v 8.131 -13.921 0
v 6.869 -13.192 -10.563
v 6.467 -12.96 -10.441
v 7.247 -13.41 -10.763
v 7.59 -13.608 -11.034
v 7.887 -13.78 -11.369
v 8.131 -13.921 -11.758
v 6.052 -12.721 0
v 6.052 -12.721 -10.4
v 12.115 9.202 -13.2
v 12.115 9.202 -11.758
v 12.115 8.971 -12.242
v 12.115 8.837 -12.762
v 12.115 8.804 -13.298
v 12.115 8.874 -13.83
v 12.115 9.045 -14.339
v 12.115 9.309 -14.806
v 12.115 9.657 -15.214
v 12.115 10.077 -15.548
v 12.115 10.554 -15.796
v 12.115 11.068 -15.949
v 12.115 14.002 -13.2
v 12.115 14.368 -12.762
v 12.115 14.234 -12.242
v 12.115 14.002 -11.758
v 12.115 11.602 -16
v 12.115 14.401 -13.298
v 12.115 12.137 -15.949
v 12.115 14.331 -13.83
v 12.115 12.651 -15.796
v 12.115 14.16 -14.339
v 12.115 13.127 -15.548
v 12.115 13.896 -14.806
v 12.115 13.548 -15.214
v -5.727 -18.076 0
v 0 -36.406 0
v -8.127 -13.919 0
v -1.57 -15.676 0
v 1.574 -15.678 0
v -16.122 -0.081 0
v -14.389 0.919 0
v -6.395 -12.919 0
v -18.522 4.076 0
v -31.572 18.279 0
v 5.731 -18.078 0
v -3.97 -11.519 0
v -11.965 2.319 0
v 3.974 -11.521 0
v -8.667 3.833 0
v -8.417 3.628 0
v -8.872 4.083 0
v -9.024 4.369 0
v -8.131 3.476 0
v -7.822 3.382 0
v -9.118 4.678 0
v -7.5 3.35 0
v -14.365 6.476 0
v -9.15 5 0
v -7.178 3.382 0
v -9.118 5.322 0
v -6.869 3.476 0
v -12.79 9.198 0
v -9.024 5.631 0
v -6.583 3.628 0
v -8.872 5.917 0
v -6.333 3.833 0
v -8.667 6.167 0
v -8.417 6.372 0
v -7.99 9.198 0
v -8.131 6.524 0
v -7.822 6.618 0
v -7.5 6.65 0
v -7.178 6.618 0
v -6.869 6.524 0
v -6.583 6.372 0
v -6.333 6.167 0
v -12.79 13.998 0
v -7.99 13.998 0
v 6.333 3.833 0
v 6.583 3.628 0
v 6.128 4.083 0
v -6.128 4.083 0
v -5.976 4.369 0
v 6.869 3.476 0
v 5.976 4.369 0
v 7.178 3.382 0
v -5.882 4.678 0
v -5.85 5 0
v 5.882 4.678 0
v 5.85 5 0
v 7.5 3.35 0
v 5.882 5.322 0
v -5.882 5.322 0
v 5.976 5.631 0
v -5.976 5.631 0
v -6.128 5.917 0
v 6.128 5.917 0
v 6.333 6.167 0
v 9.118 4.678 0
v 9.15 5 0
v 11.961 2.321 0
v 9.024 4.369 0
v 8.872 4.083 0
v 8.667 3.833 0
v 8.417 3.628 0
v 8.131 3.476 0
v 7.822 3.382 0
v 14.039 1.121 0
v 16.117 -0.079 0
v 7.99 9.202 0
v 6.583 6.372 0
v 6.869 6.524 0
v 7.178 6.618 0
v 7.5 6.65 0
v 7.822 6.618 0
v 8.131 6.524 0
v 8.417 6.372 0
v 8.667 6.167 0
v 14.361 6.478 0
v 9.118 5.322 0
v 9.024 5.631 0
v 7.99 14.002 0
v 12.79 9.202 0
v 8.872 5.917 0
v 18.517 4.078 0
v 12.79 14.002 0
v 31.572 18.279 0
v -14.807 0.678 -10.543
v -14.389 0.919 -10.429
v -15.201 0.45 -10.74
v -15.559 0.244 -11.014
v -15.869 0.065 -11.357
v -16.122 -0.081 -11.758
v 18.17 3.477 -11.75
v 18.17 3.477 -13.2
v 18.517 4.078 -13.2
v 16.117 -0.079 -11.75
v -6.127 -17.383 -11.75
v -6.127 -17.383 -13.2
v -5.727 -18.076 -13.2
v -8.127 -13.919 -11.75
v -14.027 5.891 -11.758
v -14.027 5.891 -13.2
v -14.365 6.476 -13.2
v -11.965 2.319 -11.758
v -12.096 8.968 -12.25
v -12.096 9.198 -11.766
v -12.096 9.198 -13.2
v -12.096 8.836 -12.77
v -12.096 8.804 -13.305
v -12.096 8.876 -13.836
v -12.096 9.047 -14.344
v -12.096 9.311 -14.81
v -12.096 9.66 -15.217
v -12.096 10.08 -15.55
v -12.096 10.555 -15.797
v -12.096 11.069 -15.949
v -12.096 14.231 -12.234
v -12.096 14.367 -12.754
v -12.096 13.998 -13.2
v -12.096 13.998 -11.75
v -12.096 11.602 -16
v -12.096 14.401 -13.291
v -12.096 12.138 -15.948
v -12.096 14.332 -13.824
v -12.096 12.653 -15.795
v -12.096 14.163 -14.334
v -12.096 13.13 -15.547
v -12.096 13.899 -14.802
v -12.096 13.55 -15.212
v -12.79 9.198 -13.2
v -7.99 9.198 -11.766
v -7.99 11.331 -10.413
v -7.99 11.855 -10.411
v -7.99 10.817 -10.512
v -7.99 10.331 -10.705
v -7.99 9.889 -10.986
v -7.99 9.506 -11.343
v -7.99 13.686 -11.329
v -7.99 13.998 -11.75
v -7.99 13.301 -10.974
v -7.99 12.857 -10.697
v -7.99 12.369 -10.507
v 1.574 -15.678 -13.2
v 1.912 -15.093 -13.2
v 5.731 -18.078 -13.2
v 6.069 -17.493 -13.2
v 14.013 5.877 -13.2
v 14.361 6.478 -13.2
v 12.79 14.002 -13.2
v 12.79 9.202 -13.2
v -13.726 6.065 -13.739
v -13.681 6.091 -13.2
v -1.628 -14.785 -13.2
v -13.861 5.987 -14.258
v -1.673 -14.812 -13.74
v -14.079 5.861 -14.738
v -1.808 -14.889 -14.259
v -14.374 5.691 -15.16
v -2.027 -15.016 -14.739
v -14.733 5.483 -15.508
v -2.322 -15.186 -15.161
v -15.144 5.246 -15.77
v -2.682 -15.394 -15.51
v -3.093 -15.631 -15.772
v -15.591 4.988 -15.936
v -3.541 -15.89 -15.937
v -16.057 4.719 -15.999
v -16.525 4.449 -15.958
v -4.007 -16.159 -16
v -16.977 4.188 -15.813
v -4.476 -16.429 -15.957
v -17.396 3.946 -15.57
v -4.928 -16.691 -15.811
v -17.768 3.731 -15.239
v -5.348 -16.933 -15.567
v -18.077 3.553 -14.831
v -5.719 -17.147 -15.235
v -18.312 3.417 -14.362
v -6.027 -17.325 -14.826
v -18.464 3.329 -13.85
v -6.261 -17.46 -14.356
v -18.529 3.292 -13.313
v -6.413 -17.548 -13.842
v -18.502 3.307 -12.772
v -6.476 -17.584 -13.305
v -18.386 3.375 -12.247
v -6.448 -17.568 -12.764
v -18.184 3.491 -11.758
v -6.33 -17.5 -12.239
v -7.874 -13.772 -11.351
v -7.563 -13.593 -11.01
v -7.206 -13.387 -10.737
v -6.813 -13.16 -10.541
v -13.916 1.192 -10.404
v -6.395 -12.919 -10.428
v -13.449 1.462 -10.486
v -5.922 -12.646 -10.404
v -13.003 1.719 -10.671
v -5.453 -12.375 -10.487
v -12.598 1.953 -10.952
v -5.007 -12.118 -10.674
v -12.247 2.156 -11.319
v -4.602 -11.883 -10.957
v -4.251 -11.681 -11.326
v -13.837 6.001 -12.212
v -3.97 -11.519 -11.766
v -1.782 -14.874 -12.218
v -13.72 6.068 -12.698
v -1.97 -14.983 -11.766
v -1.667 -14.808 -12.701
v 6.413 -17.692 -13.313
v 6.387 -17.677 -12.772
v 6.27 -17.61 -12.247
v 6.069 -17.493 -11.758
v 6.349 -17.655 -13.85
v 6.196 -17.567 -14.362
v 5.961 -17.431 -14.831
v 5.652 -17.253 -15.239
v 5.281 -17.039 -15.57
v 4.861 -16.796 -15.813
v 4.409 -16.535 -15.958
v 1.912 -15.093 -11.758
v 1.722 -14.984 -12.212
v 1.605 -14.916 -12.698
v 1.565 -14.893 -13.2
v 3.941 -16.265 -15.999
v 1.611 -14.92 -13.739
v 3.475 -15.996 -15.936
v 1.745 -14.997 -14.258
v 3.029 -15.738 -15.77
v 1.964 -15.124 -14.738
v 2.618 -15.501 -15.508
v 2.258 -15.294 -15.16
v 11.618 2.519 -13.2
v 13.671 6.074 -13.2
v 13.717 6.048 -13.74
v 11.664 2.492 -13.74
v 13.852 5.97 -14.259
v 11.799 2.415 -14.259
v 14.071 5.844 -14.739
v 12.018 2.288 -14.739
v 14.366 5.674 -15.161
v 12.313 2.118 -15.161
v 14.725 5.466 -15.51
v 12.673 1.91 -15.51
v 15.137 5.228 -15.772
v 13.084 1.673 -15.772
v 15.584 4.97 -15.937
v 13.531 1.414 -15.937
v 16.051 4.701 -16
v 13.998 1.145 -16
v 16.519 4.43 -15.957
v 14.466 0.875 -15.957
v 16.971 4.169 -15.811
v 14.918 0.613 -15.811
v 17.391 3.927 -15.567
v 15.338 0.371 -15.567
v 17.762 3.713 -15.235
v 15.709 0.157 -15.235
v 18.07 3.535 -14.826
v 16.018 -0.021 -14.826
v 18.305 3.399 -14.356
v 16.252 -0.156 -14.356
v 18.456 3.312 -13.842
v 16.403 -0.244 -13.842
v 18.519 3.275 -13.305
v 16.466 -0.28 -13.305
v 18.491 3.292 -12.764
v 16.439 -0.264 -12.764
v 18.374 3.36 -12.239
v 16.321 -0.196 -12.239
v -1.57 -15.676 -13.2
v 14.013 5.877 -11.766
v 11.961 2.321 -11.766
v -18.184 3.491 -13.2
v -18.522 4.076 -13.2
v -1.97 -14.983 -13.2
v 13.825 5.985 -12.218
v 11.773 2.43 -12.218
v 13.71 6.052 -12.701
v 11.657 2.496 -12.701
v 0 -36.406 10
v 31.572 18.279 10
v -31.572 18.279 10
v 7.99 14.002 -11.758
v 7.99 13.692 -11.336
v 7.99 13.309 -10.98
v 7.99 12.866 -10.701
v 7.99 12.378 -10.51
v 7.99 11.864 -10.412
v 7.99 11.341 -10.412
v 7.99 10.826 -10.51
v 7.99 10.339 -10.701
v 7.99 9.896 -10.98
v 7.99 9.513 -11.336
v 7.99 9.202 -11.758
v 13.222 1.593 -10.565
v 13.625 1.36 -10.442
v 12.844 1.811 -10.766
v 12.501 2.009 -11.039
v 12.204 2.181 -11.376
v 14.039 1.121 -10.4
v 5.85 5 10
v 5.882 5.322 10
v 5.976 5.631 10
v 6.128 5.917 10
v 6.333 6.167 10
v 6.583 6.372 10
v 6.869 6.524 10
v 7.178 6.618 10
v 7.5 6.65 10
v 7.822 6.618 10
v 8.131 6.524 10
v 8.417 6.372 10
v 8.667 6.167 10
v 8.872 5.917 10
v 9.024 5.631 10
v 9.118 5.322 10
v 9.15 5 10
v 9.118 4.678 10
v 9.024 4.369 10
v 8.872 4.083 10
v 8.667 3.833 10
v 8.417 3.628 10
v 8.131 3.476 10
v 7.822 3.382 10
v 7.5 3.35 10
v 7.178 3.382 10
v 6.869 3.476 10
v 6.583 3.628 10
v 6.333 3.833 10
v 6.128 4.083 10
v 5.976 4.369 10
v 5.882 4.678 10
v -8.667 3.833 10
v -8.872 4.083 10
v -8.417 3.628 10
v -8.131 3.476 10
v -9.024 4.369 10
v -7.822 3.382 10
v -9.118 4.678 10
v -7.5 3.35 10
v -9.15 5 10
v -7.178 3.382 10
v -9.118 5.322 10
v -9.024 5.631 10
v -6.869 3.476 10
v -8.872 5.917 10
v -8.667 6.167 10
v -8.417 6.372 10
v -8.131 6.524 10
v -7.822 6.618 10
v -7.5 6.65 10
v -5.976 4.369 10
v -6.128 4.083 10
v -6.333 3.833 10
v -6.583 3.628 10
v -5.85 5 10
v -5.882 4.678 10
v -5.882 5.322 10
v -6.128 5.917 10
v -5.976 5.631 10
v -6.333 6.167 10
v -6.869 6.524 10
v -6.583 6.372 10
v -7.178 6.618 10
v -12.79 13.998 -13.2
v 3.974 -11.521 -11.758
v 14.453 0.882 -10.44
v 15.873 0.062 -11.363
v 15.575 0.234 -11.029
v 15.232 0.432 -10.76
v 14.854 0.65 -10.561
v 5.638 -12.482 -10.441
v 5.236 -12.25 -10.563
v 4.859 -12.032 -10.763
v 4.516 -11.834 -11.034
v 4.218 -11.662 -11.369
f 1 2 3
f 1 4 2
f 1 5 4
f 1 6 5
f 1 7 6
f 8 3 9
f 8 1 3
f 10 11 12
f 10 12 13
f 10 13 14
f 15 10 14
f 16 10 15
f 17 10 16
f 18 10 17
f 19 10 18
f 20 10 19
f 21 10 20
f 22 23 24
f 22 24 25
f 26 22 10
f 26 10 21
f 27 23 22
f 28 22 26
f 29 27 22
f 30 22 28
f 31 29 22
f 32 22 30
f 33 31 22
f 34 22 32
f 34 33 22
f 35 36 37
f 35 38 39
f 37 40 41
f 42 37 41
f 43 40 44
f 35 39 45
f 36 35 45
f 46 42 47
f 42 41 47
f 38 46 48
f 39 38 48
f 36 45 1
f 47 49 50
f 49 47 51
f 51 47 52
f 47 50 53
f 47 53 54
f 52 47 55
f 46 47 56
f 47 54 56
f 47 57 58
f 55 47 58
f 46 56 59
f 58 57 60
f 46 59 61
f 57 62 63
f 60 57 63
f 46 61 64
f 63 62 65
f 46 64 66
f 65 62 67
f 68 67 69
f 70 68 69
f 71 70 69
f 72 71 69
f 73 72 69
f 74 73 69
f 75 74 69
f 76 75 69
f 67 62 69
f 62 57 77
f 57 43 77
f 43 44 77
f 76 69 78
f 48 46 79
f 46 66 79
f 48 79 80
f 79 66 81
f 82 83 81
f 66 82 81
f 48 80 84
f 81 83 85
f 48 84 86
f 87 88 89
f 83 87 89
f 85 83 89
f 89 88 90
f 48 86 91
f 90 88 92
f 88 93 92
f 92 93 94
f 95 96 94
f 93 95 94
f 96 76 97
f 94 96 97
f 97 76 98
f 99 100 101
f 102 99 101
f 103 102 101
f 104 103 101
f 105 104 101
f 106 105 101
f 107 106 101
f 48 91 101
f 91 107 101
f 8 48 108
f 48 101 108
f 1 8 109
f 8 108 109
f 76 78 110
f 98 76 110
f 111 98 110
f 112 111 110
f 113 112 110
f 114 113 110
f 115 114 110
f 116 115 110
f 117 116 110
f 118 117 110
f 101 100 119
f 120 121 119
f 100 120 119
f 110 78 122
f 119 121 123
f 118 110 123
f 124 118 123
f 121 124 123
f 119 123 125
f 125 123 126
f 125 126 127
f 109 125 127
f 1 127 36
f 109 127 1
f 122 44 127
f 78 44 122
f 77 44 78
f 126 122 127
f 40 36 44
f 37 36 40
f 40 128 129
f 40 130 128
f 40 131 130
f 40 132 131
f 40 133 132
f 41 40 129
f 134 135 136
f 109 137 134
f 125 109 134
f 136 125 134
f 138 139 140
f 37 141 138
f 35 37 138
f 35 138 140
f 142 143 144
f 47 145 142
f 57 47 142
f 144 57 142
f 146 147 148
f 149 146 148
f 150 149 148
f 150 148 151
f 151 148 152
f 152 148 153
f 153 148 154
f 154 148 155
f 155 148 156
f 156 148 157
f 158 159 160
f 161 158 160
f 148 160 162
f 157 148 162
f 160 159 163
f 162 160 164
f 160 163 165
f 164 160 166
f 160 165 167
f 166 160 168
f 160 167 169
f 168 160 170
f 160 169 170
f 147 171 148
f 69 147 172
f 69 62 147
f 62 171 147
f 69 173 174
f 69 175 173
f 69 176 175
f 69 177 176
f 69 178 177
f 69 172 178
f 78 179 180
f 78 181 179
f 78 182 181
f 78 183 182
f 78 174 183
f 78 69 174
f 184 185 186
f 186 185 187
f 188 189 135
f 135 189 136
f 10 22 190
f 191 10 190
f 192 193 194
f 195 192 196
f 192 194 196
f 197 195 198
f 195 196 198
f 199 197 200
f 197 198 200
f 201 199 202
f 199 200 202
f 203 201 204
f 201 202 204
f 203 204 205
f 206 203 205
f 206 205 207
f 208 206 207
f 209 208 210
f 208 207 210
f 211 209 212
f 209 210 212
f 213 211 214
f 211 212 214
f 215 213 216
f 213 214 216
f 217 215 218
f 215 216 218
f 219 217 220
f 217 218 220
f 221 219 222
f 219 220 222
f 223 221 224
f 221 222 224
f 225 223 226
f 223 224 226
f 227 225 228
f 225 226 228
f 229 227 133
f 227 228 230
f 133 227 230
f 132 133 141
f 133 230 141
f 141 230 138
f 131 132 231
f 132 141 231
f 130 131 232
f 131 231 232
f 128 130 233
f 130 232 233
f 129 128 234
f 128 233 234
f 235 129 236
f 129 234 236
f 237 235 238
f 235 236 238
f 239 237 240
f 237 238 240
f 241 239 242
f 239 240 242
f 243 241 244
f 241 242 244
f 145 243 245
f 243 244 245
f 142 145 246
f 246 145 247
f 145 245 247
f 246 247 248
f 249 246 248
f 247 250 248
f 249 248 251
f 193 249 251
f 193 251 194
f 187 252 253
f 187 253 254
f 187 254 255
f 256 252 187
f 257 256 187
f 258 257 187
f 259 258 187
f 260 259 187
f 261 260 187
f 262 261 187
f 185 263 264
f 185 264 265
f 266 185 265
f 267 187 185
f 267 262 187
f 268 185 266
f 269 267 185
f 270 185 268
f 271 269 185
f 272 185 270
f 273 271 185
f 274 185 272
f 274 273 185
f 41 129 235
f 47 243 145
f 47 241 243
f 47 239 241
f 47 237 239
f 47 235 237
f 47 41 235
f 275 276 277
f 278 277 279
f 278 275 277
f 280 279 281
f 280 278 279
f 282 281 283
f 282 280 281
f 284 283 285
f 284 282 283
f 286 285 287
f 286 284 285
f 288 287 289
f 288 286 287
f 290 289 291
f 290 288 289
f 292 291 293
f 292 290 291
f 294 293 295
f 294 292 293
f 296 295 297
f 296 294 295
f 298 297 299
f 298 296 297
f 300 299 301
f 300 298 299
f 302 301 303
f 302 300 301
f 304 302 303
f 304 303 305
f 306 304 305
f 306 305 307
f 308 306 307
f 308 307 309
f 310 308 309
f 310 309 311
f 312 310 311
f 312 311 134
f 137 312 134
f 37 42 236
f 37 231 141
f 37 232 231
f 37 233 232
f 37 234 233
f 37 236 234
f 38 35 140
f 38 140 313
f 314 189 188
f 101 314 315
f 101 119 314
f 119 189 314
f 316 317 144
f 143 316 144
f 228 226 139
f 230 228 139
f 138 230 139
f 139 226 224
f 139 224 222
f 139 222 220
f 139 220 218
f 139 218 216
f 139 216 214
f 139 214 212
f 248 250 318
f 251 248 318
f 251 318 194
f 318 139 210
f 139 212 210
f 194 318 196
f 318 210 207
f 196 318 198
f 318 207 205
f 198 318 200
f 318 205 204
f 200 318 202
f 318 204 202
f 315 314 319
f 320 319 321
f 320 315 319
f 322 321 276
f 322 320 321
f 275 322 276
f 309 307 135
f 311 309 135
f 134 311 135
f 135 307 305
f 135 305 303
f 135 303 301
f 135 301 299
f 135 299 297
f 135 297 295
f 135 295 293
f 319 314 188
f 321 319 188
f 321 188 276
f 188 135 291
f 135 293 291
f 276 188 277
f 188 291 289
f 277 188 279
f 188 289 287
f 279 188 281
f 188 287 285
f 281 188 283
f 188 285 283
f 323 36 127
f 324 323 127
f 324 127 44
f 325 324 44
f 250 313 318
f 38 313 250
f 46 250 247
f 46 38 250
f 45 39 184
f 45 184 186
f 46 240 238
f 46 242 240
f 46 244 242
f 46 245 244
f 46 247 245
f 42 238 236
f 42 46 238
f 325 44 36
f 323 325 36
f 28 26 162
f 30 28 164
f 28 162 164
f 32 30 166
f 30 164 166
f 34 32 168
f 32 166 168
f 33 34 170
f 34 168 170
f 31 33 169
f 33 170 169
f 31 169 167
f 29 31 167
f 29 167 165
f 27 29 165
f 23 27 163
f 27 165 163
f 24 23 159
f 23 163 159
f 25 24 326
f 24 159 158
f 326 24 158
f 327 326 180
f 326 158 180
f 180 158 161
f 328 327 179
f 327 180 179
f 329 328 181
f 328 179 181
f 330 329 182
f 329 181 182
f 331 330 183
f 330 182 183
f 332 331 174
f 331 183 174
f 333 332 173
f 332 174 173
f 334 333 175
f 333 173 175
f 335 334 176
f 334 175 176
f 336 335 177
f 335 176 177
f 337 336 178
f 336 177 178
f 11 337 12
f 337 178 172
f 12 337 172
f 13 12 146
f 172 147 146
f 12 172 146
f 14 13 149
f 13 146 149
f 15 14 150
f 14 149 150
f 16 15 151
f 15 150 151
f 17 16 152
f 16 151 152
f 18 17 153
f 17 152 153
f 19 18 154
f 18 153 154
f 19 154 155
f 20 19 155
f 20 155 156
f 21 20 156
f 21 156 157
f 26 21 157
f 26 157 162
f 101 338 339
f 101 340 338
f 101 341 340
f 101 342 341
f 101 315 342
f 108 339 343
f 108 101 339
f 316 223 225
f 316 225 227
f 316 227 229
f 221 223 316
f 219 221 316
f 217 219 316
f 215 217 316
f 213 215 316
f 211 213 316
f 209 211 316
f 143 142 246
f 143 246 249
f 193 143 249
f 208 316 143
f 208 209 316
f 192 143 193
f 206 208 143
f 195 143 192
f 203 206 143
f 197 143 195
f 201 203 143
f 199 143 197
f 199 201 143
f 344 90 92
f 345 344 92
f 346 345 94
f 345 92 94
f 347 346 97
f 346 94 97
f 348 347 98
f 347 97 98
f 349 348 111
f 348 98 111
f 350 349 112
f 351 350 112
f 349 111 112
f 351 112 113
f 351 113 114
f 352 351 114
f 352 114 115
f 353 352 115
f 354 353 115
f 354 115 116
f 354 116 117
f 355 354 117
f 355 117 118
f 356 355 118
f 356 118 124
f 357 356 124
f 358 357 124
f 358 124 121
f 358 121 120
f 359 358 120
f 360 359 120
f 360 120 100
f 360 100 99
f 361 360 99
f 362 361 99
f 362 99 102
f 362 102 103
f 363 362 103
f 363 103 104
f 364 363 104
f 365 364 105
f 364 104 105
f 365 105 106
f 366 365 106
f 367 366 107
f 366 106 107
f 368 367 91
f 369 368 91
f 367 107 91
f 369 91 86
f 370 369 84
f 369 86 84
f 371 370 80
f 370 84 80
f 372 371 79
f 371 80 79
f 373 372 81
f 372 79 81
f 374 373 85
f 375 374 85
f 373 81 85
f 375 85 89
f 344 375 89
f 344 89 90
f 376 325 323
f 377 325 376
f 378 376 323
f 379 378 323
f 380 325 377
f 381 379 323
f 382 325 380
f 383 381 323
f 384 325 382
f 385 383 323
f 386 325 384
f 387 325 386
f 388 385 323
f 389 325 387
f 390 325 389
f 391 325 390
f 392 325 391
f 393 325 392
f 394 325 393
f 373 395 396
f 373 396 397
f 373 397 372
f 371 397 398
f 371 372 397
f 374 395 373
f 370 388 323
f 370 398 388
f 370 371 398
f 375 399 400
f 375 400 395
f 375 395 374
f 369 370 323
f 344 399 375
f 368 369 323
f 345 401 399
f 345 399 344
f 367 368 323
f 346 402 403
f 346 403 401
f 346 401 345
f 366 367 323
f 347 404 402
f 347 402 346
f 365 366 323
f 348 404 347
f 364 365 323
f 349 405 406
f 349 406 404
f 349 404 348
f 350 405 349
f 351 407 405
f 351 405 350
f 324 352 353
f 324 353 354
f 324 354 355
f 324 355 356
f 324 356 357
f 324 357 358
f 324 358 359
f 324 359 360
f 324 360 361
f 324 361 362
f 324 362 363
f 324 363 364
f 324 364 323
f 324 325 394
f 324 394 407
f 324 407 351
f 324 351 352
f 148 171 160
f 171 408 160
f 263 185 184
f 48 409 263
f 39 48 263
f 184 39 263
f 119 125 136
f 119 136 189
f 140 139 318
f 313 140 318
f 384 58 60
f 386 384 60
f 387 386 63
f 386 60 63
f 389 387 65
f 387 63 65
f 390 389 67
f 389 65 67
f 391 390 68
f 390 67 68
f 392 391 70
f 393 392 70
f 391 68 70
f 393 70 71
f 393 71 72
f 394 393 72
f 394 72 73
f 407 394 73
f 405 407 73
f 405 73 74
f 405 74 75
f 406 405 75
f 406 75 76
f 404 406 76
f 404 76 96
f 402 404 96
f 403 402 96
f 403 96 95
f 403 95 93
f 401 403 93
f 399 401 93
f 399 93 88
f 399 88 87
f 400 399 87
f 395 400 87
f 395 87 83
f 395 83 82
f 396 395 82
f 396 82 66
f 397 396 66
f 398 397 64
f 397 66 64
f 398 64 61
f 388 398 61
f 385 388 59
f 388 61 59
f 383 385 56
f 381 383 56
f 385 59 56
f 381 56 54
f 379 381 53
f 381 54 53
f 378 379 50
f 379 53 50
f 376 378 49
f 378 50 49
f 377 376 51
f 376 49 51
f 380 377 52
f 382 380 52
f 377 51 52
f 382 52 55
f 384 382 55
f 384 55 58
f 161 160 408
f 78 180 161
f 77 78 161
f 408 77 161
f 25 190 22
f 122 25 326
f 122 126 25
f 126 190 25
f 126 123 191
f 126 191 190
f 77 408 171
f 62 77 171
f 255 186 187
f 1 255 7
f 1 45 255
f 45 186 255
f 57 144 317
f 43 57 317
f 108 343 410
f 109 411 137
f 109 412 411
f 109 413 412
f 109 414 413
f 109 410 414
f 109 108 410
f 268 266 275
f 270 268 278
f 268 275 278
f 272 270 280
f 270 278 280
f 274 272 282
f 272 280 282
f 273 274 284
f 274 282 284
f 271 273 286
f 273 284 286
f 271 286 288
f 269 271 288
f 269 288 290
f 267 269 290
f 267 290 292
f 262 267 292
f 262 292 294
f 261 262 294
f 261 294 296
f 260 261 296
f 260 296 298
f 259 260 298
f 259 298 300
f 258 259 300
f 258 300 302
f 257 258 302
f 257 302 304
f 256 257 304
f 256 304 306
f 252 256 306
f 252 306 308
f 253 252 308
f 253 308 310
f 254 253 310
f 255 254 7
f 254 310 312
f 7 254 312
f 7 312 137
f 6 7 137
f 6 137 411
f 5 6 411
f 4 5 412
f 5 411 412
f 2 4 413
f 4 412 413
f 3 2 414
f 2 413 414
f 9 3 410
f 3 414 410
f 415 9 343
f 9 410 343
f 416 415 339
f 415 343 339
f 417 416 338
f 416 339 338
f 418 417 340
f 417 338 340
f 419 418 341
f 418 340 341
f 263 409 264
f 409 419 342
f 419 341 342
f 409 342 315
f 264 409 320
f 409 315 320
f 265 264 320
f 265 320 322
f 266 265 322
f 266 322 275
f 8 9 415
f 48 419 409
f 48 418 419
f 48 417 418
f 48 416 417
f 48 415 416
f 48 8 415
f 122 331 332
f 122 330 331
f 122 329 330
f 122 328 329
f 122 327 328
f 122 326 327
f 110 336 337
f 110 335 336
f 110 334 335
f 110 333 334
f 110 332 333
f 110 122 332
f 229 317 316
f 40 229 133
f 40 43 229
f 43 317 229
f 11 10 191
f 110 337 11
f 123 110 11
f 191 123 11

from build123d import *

# Parameters (mm, degrees)
EXTRUDE_1_DEPTH        = 10
EXTRUDE_2_DEPTH        = 13.2
EXTRUDE_3_DEPTH        = 20.1058285
EXTRUDE_3_DEPTH_BACK   = 4
SKETCH_3_R             = 2.8
EXTRUDE_4_DEPTH        = 20.1058285
EXTRUDE_4_DEPTH_BACK   = 4.1058285
SKETCH_4_R             = 2.8
EXTRUDE_5_DEPTH        = 20.1058285
EXTRUDE_5_DEPTH_BACK   = 4.1058285
SKETCH_5_R             = 2.8
HOLE_WIZARD_M4_1_D     = 3.3
HOLE_WIZARD_M4_1_DEPTH = 10.1
HOLE_WIZARD_M4_1_TIP   = 0.991420021


with BuildPart() as part:
    # 草图1 → 凸台-拉伸1 (new body)
    with BuildSketch(Plane.XY):
        Polygon((-31.572352781, 18.279290669), (0, -36.405628463), (31.572352781, 18.279290669), align=None)
    extrude(amount=EXTRUDE_1_DEPTH)

    # 草图1<5> → 凸台-拉伸2 (add)
    with BuildSketch(Plane.XY):
        Polygon((11.960518161, 2.321180547), (14.039474758, 1.120894396), (16.117440099, -0.078819453), (18.517440099, 4.078102485), (14.360518161, 6.478102485), align=None)
        Polygon((-7.990460401, 9.197522296), (-7.990460401, 12.000572743), (-7.990460401, 13.997522296), (-12.790460401, 13.997522296), (-12.790460401, 9.197522296), align=None)
        Polygon((7.990460401, 14.002477704), (7.990460401, 12.004383545), (7.990460401, 9.202477704), (12.790460401, 9.202477704), (12.790460401, 14.002477704), align=None)
        Polygon((8.131271207, -13.921180547), (6.052314609, -12.720894396), (3.974349269, -11.521180547), (1.574349269, -15.678102485), (5.731271207, -18.078102485), align=None)
        Polygon((-3.97005776, -11.518702843), (-6.395424519, -12.918988994), (-8.126979698, -13.918702843), (-5.726979698, -18.075624781), (-1.57005776, -15.675624781), align=None)
        Polygon((-18.521731608, 4.075624781), (-16.121731608, -0.081297157), (-14.389185172, 0.918988994), (-11.96480967, 2.318702843), (-14.36480967, 6.475624781), align=None)
    extrude(amount=-EXTRUDE_2_DEPTH)

    # 草图3 → 凸台-拉伸3 (add, two sides: drawn at the far end of the back side and taken through both)
    with BuildSketch(Plane(origin=(3.9952302, -6.919941695, 0), x_dir=(0.8660254037844364, 0.5000000000000041, 0), z_dir=(-0.500000000000004, 0.8660254037844363, 0)).offset(-EXTRUDE_3_DEPTH_BACK)):
        with Locations((-11.602477704, 13.2)):
            Circle(SKETCH_3_R)
    extrude(amount=EXTRUDE_3_DEPTH + EXTRUDE_3_DEPTH_BACK)

    # 草图4 → 凸台-拉伸4 (add, two sides: drawn at the far end of the back side and taken through both)
    with BuildSketch(Plane(origin=(-7.990460401, 0, 0), x_dir=(0, 0, -1), z_dir=(1, 0, 0)).offset(-EXTRUDE_4_DEPTH_BACK)):
        with Locations((13.2, 11.602477704)):
            Circle(SKETCH_4_R)
    extrude(amount=EXTRUDE_4_DEPTH + EXTRUDE_4_DEPTH_BACK)

    # 草图5 → 凸台-拉伸5 (add, two sides: drawn at the far end of the back side and taken through both)
    with BuildSketch(Plane(origin=(3.9952302, 6.919941695, 0), x_dir=(-0.8660254037844365, 0.5000000000000039, 0), z_dir=(-0.5000000000000038, -0.8660254037844364, 0)).offset(-EXTRUDE_5_DEPTH_BACK)):
        with Locations((-11.602477704, 13.2)):
            Circle(SKETCH_5_R)
    extrude(amount=EXTRUDE_5_DEPTH + EXTRUDE_5_DEPTH_BACK)

    # M4 螺纹孔1
    with Locations(Plane.XY.offset(10)):
        with Locations((7.5, 5), (-7.5, 5)):
            Hole(HOLE_WIZARD_M4_1_D / 2, depth=HOLE_WIZARD_M4_1_DEPTH)
            with Locations((0, 0, -(HOLE_WIZARD_M4_1_DEPTH + HOLE_WIZARD_M4_1_TIP / 2))):  # 118° drill point
                Cone(0, HOLE_WIZARD_M4_1_D / 2, HOLE_WIZARD_M4_1_TIP, mode=Mode.SUBTRACT)


solid = part.part
